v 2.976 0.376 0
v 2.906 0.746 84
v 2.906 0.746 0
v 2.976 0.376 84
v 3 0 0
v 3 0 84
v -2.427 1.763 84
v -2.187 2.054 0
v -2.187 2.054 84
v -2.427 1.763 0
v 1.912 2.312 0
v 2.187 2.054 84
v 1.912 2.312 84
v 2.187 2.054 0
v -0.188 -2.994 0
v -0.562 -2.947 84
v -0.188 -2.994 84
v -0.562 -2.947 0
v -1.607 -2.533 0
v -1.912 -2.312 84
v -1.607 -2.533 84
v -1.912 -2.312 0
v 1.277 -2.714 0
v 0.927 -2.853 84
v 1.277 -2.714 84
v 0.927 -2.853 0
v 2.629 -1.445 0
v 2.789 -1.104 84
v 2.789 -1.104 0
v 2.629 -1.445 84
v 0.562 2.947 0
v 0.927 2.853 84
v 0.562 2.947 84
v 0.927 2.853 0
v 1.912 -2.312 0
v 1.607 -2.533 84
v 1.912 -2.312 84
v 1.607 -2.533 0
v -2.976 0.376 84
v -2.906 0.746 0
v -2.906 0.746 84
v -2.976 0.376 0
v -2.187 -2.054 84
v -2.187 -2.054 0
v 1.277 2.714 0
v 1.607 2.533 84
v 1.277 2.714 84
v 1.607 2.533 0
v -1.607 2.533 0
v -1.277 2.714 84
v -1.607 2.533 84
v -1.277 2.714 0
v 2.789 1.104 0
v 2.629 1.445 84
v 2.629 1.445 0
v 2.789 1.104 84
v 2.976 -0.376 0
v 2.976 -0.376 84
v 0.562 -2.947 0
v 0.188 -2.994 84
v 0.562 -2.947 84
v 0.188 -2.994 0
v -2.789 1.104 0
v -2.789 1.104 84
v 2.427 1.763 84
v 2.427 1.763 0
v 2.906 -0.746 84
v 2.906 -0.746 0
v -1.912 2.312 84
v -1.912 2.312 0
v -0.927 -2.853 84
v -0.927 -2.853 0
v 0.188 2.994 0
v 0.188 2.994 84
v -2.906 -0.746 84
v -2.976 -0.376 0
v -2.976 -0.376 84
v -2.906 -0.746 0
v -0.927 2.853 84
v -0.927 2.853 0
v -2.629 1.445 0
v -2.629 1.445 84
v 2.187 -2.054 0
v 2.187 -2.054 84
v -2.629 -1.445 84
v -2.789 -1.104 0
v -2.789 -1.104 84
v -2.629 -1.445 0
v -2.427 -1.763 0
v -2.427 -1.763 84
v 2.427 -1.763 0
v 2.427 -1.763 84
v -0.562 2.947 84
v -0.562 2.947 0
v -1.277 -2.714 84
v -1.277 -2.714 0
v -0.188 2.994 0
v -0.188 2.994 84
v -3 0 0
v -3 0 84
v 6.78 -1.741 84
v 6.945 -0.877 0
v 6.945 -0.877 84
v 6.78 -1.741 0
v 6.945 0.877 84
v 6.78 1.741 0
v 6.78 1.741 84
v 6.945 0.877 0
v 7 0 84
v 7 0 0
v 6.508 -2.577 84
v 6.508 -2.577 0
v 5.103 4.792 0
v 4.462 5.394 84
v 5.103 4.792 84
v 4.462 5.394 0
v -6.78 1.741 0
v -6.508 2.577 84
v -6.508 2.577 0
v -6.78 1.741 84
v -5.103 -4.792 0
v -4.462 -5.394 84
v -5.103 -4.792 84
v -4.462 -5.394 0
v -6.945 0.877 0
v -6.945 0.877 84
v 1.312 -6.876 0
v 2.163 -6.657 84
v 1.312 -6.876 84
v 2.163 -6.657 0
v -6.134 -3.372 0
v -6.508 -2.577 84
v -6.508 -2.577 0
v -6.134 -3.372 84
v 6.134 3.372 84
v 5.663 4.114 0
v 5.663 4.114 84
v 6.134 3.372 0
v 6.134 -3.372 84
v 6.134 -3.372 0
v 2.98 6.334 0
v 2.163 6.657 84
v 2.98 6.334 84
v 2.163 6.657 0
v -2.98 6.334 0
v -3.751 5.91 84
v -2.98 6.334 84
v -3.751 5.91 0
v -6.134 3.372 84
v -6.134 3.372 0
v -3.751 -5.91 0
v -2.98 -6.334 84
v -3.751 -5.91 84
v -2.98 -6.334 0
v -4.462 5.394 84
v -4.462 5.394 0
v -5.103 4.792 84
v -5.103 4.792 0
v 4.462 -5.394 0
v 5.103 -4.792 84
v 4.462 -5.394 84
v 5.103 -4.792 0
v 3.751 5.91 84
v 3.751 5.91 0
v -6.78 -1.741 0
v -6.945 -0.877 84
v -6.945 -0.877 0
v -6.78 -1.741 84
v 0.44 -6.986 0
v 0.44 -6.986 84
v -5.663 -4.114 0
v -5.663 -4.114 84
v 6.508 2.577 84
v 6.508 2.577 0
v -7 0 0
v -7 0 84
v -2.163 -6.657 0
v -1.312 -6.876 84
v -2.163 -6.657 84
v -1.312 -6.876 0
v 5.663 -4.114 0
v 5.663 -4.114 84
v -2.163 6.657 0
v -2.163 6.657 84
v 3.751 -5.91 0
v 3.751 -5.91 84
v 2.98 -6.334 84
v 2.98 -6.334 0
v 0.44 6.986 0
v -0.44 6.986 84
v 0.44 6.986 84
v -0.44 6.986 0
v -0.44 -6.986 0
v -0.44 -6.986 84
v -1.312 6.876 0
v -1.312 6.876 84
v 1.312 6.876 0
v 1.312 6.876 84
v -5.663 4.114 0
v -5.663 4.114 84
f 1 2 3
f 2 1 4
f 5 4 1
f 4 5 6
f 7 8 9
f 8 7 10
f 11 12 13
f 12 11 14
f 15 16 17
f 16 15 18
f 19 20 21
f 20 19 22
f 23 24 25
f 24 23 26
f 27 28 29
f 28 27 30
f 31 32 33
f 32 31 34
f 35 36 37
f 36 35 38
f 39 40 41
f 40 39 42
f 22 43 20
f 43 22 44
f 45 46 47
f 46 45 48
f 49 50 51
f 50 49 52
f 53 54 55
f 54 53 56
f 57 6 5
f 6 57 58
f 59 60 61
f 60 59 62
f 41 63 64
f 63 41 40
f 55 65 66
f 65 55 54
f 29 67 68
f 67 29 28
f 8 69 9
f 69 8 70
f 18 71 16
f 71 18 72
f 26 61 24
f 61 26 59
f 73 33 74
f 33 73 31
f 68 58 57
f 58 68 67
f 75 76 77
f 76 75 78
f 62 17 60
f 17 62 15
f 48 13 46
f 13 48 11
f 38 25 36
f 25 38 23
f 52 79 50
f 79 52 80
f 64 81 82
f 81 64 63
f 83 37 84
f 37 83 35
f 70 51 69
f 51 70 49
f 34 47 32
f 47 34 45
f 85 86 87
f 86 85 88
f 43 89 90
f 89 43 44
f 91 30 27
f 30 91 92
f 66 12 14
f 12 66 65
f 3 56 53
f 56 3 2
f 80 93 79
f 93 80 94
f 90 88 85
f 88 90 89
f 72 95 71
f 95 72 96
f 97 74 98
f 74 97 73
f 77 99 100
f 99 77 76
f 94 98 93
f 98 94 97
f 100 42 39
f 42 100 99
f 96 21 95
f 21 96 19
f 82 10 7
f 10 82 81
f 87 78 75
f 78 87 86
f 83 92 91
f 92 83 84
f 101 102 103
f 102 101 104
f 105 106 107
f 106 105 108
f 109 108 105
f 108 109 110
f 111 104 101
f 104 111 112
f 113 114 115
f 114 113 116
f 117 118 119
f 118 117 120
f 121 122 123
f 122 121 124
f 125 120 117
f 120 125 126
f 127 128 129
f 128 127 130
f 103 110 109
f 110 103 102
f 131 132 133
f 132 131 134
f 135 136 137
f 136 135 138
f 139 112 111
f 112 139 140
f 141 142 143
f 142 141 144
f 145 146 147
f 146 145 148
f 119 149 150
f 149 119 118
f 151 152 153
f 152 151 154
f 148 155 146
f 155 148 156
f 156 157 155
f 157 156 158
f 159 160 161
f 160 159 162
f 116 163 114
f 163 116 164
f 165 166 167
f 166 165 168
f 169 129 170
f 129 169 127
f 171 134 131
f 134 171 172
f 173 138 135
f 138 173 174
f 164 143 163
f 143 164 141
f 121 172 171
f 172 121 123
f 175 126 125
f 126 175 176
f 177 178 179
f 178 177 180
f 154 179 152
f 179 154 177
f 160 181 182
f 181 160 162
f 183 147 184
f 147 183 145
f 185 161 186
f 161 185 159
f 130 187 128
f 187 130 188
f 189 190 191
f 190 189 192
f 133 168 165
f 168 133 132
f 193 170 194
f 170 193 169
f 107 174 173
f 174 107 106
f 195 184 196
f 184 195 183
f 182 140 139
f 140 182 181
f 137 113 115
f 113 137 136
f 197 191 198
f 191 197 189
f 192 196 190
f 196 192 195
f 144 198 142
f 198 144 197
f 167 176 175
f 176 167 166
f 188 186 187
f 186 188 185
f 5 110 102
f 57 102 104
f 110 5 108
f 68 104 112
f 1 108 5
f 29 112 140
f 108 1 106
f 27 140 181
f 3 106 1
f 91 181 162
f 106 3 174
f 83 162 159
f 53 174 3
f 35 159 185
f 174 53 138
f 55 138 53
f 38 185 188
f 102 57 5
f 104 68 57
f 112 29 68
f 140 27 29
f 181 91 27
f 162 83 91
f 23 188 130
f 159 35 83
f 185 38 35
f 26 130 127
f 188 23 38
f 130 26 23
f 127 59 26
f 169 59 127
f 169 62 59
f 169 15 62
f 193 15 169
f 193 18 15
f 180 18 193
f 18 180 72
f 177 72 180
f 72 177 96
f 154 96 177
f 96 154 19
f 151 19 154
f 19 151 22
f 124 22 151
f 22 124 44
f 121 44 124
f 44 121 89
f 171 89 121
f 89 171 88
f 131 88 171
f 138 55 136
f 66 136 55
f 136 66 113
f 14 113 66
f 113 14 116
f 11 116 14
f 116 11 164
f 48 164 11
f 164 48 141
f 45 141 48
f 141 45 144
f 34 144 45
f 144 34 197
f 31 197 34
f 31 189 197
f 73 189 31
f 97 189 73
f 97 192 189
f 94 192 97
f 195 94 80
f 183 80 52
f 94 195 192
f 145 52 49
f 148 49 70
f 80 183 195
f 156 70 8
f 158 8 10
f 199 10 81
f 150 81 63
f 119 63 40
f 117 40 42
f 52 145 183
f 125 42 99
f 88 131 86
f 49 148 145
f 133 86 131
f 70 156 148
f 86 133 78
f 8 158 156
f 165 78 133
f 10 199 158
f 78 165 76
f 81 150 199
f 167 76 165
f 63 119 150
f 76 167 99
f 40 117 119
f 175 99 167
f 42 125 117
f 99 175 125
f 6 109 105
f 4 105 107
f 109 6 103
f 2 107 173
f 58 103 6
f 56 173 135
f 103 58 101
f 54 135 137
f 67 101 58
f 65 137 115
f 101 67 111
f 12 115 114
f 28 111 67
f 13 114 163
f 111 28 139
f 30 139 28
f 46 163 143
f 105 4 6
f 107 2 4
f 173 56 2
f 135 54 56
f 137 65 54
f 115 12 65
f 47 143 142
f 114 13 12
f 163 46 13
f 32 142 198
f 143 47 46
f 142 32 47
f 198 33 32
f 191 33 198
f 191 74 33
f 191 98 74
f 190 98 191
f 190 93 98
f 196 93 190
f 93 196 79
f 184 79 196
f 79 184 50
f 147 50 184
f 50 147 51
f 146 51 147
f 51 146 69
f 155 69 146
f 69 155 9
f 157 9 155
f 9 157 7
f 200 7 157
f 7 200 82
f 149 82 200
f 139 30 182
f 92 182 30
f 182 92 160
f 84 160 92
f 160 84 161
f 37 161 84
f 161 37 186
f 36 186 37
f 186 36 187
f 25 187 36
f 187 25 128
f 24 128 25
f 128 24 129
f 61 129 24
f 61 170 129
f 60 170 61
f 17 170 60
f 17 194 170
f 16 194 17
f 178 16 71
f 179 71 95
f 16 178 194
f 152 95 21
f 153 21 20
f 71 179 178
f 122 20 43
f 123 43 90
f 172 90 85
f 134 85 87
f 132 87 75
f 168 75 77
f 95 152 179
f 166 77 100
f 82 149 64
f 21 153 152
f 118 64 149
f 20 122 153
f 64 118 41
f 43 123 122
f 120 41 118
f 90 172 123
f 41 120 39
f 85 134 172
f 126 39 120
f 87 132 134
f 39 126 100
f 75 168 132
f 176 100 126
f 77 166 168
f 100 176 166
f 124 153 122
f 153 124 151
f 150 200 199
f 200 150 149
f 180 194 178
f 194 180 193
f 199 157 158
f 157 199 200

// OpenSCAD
$fn = 50;


difference() {
	union() {
		cylinder(h = 84, r = 7.0000000000);
	}
	union() {
		translate(v = [0.0000000000, 0.0000000000, -100.0000000000]) {
			cylinder(h = 200, r = 3.0000000000);
		}
		cylinder(h = 84, r = 1.5000000000);
		cylinder(h = 84, r = 1.5000000000);
		cylinder(h = 84, r = 1.5000000000);
	}
}
